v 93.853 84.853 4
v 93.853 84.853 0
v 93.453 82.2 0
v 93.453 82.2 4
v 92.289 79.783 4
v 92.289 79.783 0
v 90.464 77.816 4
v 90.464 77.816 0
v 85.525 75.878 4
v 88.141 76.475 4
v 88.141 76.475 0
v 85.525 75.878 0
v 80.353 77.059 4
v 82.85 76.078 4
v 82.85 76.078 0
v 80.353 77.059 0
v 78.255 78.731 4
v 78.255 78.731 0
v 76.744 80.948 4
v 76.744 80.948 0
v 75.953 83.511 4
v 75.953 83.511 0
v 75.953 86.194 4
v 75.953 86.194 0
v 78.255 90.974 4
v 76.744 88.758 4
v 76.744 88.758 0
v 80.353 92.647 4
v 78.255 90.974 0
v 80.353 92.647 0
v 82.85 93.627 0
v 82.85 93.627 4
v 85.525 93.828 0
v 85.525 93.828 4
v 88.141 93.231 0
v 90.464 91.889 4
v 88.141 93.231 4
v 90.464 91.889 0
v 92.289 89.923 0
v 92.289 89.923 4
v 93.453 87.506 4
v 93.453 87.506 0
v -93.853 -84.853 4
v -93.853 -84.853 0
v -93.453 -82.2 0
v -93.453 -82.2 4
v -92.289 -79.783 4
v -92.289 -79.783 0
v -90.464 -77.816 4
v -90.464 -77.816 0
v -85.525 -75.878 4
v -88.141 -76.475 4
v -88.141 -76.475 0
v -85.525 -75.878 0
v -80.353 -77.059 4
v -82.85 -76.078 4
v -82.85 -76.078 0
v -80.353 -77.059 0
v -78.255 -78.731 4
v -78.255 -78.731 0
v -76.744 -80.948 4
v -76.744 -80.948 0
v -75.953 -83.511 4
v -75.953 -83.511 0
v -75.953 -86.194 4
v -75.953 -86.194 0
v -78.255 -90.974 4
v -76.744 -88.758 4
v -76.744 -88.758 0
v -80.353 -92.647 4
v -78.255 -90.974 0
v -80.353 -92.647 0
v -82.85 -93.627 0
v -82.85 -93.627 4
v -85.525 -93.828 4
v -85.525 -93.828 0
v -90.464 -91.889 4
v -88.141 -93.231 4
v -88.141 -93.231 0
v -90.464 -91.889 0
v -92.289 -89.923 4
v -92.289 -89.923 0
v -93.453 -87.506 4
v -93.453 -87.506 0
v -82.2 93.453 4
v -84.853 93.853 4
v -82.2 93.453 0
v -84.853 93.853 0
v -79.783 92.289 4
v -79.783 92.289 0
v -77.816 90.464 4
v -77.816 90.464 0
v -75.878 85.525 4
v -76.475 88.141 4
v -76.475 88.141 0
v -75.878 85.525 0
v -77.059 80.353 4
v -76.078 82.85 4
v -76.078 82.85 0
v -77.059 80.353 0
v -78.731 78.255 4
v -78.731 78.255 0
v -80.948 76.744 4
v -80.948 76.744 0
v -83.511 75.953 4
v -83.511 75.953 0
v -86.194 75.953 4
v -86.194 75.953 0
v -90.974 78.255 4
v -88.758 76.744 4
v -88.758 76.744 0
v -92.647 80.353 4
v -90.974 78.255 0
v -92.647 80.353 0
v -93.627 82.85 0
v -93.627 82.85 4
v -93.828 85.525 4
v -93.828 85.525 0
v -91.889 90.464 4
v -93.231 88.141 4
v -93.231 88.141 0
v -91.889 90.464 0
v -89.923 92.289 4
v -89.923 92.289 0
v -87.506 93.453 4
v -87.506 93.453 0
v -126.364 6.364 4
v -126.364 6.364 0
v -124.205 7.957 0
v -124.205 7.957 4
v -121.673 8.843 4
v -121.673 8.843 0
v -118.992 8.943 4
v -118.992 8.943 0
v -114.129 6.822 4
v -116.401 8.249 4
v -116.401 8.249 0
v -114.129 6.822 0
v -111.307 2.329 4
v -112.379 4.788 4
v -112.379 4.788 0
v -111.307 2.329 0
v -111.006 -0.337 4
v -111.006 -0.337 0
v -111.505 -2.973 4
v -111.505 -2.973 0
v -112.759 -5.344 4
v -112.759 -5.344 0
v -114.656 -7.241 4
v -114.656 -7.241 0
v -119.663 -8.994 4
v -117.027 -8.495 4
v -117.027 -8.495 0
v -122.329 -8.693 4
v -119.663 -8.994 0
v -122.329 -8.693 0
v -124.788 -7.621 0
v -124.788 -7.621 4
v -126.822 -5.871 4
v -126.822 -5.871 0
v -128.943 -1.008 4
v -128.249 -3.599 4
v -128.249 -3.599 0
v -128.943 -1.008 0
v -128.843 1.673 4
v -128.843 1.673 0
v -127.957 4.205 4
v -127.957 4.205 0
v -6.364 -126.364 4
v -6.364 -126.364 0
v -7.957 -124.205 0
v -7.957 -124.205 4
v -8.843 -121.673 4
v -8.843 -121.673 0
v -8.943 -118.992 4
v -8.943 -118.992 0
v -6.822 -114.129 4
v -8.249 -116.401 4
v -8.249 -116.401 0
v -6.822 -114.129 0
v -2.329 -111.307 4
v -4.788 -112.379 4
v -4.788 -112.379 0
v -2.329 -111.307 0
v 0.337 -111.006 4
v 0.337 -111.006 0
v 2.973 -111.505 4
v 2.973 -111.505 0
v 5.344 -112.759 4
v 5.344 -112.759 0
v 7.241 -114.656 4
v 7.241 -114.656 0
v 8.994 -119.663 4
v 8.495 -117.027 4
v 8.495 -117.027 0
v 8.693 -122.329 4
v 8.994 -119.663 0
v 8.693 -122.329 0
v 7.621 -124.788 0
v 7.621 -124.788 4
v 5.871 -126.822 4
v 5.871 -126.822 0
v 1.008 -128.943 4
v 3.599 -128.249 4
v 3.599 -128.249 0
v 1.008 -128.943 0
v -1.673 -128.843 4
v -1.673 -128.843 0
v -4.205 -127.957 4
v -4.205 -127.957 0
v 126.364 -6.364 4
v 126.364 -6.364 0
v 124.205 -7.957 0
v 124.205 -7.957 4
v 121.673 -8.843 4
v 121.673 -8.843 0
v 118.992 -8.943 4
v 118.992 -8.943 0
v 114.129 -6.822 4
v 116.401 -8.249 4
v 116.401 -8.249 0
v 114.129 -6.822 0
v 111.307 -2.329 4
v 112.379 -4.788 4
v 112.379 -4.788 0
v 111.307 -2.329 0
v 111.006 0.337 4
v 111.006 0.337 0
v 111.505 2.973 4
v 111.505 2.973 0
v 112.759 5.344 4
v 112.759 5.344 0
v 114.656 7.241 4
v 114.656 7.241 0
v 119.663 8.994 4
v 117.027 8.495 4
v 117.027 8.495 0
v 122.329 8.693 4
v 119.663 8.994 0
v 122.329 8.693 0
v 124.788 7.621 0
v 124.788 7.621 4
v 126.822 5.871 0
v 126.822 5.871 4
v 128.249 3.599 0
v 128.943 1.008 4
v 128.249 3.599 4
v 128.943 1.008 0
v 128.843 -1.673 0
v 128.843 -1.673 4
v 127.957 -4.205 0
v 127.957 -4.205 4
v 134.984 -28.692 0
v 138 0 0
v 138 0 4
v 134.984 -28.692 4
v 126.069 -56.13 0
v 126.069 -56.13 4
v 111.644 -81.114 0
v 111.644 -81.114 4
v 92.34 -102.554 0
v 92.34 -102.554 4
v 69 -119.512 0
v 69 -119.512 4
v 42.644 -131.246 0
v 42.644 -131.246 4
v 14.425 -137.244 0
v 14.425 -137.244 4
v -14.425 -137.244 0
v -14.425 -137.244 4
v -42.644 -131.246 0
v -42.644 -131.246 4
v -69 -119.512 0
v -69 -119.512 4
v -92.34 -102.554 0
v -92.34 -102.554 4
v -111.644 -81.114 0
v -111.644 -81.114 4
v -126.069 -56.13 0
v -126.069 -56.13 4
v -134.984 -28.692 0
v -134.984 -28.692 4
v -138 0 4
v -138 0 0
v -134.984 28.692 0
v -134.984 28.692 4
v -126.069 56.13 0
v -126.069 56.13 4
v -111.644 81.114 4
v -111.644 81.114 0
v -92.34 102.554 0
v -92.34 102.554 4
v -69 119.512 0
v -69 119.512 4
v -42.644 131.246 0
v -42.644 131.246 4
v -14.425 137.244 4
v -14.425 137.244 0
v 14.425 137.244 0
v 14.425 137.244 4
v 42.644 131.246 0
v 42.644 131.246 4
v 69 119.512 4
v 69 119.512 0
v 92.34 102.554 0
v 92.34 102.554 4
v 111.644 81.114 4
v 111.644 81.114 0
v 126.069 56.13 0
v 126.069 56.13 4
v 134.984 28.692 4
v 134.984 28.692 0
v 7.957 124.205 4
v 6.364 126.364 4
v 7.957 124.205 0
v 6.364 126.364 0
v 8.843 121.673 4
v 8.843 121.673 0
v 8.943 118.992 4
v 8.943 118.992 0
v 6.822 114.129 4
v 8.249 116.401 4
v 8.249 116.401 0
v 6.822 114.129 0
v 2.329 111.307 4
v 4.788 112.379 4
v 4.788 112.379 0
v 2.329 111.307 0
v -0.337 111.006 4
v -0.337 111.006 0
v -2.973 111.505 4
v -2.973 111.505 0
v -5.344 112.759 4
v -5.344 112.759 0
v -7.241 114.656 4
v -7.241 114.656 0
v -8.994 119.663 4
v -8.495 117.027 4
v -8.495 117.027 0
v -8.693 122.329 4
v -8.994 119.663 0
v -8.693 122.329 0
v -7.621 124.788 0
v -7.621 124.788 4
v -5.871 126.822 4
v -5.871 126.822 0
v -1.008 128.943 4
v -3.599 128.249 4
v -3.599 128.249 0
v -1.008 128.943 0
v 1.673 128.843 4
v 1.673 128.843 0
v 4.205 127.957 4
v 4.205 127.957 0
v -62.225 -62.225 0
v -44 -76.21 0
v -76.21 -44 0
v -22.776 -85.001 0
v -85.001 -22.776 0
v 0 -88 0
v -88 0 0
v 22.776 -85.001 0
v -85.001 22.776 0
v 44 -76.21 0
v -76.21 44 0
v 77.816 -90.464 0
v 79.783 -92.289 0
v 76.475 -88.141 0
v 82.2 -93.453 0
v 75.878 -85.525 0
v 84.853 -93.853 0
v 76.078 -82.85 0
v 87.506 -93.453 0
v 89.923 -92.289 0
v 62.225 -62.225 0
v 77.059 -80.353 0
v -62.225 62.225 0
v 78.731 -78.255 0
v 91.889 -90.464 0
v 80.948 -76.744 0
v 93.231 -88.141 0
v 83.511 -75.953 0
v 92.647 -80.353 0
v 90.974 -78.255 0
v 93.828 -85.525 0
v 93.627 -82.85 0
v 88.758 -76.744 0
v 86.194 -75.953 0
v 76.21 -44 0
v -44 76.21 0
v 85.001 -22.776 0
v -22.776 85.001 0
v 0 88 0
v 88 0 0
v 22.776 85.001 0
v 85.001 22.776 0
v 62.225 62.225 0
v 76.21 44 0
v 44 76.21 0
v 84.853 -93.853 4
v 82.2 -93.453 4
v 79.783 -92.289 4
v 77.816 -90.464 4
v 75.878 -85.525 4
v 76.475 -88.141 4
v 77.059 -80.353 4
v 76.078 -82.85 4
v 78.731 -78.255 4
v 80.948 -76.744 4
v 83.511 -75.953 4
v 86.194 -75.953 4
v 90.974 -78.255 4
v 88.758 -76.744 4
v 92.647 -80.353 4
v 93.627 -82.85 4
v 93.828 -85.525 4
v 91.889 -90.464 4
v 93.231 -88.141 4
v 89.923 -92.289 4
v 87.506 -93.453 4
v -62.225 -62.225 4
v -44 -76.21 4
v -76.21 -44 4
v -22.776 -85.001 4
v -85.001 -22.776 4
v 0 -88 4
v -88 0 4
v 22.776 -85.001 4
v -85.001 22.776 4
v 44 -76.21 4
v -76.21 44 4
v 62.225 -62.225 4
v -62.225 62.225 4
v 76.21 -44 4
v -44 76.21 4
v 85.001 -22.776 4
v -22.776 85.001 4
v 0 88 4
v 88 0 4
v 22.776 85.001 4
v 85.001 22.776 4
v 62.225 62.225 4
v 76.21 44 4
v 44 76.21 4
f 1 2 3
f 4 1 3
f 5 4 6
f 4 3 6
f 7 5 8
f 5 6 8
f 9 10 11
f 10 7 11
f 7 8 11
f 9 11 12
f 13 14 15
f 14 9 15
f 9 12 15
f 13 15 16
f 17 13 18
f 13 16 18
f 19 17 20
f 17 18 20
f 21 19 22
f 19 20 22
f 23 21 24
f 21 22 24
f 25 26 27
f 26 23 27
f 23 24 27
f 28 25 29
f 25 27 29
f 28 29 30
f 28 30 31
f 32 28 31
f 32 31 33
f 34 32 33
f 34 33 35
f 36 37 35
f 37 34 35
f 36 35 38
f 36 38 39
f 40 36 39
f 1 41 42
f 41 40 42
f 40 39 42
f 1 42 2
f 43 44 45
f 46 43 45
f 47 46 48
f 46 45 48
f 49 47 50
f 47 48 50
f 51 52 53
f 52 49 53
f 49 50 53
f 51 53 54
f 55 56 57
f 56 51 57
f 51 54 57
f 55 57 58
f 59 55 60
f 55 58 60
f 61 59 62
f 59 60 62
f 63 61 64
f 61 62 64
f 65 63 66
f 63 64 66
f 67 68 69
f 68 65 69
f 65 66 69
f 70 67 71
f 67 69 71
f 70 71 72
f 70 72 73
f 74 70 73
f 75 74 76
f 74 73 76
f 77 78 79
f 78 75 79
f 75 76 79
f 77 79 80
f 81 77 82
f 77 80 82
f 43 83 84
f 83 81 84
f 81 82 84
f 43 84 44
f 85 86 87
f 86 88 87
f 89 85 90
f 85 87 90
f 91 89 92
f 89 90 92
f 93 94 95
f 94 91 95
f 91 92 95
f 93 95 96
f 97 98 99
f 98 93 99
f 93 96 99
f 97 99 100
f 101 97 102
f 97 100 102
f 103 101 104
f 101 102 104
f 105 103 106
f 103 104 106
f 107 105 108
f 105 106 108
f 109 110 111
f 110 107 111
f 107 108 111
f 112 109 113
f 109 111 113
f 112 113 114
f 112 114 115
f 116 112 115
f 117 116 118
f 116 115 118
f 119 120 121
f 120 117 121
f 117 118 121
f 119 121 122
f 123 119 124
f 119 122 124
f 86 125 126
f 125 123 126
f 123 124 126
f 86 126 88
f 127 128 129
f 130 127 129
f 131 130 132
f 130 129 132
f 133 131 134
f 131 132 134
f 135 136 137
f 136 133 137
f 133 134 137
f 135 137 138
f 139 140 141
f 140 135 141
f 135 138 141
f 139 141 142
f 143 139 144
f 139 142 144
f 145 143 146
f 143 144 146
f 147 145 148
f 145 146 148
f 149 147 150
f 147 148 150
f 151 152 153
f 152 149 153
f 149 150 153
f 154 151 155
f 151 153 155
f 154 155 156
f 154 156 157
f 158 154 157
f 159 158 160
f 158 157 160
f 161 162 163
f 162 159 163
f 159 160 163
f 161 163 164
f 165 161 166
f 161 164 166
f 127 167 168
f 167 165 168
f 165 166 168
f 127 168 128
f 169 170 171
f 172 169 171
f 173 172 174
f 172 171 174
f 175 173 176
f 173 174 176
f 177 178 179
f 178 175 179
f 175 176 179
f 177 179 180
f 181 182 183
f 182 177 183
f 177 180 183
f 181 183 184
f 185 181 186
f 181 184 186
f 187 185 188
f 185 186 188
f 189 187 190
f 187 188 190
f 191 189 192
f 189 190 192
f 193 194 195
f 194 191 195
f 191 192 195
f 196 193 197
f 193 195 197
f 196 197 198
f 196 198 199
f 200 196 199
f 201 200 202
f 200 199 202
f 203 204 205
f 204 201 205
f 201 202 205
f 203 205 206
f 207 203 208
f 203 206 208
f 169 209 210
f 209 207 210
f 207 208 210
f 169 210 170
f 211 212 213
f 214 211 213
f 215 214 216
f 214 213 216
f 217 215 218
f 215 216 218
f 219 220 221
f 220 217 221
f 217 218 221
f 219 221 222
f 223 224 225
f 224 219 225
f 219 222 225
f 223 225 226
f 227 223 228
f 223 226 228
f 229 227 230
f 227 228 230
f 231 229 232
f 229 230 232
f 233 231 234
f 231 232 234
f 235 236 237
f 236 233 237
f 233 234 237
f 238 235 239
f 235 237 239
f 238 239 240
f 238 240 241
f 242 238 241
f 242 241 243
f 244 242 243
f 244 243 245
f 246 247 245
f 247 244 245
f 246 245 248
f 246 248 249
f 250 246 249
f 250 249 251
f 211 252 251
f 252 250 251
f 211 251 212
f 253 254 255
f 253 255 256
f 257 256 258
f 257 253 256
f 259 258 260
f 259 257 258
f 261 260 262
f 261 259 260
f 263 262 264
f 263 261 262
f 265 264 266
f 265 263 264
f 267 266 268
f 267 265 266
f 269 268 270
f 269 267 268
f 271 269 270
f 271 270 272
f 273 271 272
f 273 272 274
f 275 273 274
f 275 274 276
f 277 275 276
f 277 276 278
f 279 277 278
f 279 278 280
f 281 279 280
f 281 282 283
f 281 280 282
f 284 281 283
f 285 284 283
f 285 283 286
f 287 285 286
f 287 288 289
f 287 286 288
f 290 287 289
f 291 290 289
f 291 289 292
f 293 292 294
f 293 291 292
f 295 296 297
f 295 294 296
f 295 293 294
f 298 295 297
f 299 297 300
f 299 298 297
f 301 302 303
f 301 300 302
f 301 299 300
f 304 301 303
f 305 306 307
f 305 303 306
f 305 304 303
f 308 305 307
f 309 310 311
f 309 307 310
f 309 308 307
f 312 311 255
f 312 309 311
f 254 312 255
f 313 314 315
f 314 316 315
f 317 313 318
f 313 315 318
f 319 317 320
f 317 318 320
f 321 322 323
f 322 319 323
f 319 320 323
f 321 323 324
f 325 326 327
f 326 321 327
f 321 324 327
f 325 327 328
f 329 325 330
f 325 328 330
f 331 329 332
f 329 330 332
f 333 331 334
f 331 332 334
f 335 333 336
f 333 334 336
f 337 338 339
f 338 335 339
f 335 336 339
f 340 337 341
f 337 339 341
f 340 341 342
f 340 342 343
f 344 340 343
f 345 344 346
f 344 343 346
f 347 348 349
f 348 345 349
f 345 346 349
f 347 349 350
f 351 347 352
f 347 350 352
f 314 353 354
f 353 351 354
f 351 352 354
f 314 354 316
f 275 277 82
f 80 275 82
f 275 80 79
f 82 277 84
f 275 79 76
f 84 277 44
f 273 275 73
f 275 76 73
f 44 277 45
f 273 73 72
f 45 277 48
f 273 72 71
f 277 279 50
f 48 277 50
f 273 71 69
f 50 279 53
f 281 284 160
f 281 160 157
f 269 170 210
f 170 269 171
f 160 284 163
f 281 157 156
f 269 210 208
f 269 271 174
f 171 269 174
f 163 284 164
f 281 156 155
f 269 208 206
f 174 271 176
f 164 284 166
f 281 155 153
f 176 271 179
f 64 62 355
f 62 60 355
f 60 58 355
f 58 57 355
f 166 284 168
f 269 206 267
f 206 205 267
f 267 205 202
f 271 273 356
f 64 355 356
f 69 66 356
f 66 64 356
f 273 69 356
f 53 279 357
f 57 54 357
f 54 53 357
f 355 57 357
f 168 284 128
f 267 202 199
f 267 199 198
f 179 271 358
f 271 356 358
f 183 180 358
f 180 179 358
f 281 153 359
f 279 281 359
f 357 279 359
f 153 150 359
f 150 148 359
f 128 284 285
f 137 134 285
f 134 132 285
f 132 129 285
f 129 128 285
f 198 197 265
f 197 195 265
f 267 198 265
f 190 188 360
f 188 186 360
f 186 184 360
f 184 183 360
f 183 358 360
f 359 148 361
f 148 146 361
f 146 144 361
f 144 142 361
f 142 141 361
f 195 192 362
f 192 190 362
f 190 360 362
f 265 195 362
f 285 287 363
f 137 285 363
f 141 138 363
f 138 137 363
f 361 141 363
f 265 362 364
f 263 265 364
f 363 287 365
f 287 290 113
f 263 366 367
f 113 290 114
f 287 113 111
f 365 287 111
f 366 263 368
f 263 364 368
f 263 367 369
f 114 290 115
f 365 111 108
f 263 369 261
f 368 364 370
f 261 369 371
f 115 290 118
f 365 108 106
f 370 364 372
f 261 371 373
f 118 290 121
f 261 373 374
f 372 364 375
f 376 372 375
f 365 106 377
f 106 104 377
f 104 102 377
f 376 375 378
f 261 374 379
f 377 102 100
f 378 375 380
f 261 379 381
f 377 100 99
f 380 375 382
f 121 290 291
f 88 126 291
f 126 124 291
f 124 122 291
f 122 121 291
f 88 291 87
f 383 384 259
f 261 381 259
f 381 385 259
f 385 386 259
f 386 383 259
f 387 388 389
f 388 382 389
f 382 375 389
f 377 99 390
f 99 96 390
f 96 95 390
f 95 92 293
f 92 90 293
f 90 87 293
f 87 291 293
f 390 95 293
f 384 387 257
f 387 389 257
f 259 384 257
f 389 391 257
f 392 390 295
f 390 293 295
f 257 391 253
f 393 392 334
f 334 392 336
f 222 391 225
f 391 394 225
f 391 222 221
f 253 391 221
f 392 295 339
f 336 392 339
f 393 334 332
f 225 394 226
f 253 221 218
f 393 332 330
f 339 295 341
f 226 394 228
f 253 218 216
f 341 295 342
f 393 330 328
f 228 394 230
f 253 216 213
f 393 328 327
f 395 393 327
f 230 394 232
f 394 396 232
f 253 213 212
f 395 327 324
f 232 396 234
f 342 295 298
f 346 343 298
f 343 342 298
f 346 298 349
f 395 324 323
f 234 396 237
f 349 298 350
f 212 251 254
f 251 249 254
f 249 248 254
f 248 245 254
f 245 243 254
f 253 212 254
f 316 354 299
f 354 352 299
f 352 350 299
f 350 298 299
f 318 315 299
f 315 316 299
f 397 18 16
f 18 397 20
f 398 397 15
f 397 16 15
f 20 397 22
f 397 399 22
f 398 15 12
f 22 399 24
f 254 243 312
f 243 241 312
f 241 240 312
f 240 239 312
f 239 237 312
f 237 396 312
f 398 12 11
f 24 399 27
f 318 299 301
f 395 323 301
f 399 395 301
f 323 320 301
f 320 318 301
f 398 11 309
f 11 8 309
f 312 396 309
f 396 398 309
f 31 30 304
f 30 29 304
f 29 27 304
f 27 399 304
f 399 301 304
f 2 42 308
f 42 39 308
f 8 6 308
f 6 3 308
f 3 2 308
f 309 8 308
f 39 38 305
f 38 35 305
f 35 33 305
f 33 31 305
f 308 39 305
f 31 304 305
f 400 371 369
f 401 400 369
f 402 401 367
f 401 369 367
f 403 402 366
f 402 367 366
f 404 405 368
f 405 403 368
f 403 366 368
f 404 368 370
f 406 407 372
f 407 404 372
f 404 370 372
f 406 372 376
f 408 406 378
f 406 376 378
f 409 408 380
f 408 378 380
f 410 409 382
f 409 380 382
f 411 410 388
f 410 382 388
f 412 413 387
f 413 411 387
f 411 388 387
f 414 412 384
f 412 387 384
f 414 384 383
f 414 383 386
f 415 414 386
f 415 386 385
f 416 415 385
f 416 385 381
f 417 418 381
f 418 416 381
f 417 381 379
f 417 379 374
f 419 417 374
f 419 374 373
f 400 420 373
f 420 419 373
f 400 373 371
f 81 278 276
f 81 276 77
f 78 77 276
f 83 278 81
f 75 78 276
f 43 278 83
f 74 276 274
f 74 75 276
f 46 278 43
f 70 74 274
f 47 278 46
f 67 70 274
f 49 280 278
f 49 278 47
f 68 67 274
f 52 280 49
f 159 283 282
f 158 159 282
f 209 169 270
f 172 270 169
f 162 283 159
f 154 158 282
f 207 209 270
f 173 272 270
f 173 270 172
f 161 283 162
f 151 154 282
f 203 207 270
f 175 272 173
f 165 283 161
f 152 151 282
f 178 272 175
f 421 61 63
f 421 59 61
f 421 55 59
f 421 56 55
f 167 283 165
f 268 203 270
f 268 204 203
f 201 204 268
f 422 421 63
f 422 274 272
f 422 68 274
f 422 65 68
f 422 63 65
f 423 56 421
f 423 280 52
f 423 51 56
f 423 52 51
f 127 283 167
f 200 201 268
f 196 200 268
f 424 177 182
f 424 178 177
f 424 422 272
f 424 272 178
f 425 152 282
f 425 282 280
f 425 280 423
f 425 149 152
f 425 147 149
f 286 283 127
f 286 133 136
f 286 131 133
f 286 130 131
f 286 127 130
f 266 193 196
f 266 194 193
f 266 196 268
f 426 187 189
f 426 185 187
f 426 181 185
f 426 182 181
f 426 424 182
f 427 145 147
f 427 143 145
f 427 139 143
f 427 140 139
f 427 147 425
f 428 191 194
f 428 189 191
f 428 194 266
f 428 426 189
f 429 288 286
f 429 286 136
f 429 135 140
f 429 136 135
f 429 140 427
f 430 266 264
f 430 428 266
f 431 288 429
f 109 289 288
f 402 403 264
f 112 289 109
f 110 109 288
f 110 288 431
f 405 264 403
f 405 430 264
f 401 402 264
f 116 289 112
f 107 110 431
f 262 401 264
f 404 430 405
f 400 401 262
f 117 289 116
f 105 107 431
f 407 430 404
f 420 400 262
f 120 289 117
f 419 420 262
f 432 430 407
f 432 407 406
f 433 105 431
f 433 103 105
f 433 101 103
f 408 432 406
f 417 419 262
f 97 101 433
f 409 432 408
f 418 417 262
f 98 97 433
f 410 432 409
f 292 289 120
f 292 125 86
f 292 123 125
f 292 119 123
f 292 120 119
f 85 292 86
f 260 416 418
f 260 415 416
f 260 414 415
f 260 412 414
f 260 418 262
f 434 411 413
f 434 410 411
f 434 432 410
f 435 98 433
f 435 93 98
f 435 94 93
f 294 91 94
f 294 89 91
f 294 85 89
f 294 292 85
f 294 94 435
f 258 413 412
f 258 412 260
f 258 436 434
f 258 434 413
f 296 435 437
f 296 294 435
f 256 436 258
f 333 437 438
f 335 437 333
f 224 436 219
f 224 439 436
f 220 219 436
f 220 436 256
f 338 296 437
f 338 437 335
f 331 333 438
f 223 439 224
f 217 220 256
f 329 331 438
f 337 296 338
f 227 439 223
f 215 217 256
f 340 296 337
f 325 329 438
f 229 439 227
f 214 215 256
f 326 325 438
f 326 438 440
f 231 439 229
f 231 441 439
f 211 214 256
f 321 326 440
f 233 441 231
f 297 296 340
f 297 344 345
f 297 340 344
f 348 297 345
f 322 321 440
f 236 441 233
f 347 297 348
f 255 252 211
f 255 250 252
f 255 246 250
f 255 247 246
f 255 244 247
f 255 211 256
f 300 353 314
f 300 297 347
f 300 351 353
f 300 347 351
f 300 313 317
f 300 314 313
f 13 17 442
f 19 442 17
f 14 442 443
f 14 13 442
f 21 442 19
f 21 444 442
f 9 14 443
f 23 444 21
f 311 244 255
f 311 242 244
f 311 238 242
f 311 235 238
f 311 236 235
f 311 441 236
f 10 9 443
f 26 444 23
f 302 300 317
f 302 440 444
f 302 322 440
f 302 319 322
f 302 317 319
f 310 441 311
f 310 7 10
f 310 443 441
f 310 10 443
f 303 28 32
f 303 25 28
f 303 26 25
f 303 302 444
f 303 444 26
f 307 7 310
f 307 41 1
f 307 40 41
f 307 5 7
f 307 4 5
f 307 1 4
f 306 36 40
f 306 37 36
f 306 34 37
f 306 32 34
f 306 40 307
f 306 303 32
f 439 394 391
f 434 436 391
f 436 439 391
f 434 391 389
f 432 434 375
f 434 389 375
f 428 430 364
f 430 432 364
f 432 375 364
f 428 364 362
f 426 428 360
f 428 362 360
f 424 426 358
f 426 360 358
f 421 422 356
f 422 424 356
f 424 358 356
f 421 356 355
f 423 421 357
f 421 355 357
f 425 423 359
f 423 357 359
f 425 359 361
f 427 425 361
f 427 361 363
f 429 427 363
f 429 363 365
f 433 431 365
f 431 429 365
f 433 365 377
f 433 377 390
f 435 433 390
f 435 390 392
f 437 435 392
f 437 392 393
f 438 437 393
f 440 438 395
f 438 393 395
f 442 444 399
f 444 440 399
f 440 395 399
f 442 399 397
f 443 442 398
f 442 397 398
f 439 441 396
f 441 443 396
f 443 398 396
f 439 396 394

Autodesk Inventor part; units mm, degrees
ref_plane "YZ Plane" through (0, 0, 0) normal (1, 0, 0) x (0, 1, 0)
ref_plane "XZ Plane" through (0, 0, 0) normal (0, 1, 0) x (-1, 0, 0)
ref_plane "XY Plane" through (0, 0, 0) normal (0, 0, 1) x (1, 0, 0)
sketch "Sketch1" plane through (0, 0, 0) normal (0, 0, 1) x (1, 0, 0)
  circle A0 centre (0, 0) radius 88
  circle A1 centre (0, 0) radius 138
  line L0 (97.5807, -97.5807) -> (-97.5807, 97.5807) construction
  line L1 (-97.5807, -97.5807) -> (97.5807, 97.5807) construction
  point P0 (0, 88)
  dimension "d44" = 176
  dimension "d23" = 276
extrude "Plate1" add sketch "Sketch1" along normal blind 4
sketch "Sketch6" plane through (0, 0, 0) normal (0, 0, 1) x (1, 0, 0)
  line L0 (0, 0) -> (0, 120) construction
  circle A0 centre (0, 0) radius 120 construction
  line L1 (0, 0) -> (84.8528, 84.8528) construction
  circle A1 centre (84.8528, 84.8528) radius 9
  dimension "d32" = 18
  dimension "d33" = 240
  dimension "d34" = 45
extrude "Cut2" cut sketch "Sketch6" along normal blind 4
pattern_circular "Circular Pattern2" count 8 over 360 about axis through (0, 0, -10) along (0, 0, -1) of "Cut2"
equation "\"d32\" = Flange_d_hole_diam"
equation "\"d33\" = Flange_D1_hole_center"
equation "\"d35\" = Thickness"
equation "\"d2\" = Thickness"
equation "\"BendReliefWidth\" = Thickness"
equation "\"BendReliefDepth\" = 0.5 * Thickness"
equation "\"CornerReliefSize\" = 4 * Thickness"
equation "\"MinimumRemnant\" = 2 * Thickness"
equation "\"TransitionRadius\" = BendRadius"
equation "\"JacobiRadiusSize\" = BendRadius"
equation "\"GapSize\" = Thickness"
equation "\"Octaeder_side\" = d41"
equation "\"Octaeder_flange_lenth\" = d42"
equation "\"Flange_d_hole_diam\" = 18"
equation "\"Flange_D1_hole_center\" = 240"
equation "\"Thickness\" = 4"
equation "\"BendRadius\" = 6"
equation "\"d41\" = 55.918831"
equation "\"d42\" = 72.5"
properties part number "DSB 113 drain system loose flange double" material "Stainless Steel"
